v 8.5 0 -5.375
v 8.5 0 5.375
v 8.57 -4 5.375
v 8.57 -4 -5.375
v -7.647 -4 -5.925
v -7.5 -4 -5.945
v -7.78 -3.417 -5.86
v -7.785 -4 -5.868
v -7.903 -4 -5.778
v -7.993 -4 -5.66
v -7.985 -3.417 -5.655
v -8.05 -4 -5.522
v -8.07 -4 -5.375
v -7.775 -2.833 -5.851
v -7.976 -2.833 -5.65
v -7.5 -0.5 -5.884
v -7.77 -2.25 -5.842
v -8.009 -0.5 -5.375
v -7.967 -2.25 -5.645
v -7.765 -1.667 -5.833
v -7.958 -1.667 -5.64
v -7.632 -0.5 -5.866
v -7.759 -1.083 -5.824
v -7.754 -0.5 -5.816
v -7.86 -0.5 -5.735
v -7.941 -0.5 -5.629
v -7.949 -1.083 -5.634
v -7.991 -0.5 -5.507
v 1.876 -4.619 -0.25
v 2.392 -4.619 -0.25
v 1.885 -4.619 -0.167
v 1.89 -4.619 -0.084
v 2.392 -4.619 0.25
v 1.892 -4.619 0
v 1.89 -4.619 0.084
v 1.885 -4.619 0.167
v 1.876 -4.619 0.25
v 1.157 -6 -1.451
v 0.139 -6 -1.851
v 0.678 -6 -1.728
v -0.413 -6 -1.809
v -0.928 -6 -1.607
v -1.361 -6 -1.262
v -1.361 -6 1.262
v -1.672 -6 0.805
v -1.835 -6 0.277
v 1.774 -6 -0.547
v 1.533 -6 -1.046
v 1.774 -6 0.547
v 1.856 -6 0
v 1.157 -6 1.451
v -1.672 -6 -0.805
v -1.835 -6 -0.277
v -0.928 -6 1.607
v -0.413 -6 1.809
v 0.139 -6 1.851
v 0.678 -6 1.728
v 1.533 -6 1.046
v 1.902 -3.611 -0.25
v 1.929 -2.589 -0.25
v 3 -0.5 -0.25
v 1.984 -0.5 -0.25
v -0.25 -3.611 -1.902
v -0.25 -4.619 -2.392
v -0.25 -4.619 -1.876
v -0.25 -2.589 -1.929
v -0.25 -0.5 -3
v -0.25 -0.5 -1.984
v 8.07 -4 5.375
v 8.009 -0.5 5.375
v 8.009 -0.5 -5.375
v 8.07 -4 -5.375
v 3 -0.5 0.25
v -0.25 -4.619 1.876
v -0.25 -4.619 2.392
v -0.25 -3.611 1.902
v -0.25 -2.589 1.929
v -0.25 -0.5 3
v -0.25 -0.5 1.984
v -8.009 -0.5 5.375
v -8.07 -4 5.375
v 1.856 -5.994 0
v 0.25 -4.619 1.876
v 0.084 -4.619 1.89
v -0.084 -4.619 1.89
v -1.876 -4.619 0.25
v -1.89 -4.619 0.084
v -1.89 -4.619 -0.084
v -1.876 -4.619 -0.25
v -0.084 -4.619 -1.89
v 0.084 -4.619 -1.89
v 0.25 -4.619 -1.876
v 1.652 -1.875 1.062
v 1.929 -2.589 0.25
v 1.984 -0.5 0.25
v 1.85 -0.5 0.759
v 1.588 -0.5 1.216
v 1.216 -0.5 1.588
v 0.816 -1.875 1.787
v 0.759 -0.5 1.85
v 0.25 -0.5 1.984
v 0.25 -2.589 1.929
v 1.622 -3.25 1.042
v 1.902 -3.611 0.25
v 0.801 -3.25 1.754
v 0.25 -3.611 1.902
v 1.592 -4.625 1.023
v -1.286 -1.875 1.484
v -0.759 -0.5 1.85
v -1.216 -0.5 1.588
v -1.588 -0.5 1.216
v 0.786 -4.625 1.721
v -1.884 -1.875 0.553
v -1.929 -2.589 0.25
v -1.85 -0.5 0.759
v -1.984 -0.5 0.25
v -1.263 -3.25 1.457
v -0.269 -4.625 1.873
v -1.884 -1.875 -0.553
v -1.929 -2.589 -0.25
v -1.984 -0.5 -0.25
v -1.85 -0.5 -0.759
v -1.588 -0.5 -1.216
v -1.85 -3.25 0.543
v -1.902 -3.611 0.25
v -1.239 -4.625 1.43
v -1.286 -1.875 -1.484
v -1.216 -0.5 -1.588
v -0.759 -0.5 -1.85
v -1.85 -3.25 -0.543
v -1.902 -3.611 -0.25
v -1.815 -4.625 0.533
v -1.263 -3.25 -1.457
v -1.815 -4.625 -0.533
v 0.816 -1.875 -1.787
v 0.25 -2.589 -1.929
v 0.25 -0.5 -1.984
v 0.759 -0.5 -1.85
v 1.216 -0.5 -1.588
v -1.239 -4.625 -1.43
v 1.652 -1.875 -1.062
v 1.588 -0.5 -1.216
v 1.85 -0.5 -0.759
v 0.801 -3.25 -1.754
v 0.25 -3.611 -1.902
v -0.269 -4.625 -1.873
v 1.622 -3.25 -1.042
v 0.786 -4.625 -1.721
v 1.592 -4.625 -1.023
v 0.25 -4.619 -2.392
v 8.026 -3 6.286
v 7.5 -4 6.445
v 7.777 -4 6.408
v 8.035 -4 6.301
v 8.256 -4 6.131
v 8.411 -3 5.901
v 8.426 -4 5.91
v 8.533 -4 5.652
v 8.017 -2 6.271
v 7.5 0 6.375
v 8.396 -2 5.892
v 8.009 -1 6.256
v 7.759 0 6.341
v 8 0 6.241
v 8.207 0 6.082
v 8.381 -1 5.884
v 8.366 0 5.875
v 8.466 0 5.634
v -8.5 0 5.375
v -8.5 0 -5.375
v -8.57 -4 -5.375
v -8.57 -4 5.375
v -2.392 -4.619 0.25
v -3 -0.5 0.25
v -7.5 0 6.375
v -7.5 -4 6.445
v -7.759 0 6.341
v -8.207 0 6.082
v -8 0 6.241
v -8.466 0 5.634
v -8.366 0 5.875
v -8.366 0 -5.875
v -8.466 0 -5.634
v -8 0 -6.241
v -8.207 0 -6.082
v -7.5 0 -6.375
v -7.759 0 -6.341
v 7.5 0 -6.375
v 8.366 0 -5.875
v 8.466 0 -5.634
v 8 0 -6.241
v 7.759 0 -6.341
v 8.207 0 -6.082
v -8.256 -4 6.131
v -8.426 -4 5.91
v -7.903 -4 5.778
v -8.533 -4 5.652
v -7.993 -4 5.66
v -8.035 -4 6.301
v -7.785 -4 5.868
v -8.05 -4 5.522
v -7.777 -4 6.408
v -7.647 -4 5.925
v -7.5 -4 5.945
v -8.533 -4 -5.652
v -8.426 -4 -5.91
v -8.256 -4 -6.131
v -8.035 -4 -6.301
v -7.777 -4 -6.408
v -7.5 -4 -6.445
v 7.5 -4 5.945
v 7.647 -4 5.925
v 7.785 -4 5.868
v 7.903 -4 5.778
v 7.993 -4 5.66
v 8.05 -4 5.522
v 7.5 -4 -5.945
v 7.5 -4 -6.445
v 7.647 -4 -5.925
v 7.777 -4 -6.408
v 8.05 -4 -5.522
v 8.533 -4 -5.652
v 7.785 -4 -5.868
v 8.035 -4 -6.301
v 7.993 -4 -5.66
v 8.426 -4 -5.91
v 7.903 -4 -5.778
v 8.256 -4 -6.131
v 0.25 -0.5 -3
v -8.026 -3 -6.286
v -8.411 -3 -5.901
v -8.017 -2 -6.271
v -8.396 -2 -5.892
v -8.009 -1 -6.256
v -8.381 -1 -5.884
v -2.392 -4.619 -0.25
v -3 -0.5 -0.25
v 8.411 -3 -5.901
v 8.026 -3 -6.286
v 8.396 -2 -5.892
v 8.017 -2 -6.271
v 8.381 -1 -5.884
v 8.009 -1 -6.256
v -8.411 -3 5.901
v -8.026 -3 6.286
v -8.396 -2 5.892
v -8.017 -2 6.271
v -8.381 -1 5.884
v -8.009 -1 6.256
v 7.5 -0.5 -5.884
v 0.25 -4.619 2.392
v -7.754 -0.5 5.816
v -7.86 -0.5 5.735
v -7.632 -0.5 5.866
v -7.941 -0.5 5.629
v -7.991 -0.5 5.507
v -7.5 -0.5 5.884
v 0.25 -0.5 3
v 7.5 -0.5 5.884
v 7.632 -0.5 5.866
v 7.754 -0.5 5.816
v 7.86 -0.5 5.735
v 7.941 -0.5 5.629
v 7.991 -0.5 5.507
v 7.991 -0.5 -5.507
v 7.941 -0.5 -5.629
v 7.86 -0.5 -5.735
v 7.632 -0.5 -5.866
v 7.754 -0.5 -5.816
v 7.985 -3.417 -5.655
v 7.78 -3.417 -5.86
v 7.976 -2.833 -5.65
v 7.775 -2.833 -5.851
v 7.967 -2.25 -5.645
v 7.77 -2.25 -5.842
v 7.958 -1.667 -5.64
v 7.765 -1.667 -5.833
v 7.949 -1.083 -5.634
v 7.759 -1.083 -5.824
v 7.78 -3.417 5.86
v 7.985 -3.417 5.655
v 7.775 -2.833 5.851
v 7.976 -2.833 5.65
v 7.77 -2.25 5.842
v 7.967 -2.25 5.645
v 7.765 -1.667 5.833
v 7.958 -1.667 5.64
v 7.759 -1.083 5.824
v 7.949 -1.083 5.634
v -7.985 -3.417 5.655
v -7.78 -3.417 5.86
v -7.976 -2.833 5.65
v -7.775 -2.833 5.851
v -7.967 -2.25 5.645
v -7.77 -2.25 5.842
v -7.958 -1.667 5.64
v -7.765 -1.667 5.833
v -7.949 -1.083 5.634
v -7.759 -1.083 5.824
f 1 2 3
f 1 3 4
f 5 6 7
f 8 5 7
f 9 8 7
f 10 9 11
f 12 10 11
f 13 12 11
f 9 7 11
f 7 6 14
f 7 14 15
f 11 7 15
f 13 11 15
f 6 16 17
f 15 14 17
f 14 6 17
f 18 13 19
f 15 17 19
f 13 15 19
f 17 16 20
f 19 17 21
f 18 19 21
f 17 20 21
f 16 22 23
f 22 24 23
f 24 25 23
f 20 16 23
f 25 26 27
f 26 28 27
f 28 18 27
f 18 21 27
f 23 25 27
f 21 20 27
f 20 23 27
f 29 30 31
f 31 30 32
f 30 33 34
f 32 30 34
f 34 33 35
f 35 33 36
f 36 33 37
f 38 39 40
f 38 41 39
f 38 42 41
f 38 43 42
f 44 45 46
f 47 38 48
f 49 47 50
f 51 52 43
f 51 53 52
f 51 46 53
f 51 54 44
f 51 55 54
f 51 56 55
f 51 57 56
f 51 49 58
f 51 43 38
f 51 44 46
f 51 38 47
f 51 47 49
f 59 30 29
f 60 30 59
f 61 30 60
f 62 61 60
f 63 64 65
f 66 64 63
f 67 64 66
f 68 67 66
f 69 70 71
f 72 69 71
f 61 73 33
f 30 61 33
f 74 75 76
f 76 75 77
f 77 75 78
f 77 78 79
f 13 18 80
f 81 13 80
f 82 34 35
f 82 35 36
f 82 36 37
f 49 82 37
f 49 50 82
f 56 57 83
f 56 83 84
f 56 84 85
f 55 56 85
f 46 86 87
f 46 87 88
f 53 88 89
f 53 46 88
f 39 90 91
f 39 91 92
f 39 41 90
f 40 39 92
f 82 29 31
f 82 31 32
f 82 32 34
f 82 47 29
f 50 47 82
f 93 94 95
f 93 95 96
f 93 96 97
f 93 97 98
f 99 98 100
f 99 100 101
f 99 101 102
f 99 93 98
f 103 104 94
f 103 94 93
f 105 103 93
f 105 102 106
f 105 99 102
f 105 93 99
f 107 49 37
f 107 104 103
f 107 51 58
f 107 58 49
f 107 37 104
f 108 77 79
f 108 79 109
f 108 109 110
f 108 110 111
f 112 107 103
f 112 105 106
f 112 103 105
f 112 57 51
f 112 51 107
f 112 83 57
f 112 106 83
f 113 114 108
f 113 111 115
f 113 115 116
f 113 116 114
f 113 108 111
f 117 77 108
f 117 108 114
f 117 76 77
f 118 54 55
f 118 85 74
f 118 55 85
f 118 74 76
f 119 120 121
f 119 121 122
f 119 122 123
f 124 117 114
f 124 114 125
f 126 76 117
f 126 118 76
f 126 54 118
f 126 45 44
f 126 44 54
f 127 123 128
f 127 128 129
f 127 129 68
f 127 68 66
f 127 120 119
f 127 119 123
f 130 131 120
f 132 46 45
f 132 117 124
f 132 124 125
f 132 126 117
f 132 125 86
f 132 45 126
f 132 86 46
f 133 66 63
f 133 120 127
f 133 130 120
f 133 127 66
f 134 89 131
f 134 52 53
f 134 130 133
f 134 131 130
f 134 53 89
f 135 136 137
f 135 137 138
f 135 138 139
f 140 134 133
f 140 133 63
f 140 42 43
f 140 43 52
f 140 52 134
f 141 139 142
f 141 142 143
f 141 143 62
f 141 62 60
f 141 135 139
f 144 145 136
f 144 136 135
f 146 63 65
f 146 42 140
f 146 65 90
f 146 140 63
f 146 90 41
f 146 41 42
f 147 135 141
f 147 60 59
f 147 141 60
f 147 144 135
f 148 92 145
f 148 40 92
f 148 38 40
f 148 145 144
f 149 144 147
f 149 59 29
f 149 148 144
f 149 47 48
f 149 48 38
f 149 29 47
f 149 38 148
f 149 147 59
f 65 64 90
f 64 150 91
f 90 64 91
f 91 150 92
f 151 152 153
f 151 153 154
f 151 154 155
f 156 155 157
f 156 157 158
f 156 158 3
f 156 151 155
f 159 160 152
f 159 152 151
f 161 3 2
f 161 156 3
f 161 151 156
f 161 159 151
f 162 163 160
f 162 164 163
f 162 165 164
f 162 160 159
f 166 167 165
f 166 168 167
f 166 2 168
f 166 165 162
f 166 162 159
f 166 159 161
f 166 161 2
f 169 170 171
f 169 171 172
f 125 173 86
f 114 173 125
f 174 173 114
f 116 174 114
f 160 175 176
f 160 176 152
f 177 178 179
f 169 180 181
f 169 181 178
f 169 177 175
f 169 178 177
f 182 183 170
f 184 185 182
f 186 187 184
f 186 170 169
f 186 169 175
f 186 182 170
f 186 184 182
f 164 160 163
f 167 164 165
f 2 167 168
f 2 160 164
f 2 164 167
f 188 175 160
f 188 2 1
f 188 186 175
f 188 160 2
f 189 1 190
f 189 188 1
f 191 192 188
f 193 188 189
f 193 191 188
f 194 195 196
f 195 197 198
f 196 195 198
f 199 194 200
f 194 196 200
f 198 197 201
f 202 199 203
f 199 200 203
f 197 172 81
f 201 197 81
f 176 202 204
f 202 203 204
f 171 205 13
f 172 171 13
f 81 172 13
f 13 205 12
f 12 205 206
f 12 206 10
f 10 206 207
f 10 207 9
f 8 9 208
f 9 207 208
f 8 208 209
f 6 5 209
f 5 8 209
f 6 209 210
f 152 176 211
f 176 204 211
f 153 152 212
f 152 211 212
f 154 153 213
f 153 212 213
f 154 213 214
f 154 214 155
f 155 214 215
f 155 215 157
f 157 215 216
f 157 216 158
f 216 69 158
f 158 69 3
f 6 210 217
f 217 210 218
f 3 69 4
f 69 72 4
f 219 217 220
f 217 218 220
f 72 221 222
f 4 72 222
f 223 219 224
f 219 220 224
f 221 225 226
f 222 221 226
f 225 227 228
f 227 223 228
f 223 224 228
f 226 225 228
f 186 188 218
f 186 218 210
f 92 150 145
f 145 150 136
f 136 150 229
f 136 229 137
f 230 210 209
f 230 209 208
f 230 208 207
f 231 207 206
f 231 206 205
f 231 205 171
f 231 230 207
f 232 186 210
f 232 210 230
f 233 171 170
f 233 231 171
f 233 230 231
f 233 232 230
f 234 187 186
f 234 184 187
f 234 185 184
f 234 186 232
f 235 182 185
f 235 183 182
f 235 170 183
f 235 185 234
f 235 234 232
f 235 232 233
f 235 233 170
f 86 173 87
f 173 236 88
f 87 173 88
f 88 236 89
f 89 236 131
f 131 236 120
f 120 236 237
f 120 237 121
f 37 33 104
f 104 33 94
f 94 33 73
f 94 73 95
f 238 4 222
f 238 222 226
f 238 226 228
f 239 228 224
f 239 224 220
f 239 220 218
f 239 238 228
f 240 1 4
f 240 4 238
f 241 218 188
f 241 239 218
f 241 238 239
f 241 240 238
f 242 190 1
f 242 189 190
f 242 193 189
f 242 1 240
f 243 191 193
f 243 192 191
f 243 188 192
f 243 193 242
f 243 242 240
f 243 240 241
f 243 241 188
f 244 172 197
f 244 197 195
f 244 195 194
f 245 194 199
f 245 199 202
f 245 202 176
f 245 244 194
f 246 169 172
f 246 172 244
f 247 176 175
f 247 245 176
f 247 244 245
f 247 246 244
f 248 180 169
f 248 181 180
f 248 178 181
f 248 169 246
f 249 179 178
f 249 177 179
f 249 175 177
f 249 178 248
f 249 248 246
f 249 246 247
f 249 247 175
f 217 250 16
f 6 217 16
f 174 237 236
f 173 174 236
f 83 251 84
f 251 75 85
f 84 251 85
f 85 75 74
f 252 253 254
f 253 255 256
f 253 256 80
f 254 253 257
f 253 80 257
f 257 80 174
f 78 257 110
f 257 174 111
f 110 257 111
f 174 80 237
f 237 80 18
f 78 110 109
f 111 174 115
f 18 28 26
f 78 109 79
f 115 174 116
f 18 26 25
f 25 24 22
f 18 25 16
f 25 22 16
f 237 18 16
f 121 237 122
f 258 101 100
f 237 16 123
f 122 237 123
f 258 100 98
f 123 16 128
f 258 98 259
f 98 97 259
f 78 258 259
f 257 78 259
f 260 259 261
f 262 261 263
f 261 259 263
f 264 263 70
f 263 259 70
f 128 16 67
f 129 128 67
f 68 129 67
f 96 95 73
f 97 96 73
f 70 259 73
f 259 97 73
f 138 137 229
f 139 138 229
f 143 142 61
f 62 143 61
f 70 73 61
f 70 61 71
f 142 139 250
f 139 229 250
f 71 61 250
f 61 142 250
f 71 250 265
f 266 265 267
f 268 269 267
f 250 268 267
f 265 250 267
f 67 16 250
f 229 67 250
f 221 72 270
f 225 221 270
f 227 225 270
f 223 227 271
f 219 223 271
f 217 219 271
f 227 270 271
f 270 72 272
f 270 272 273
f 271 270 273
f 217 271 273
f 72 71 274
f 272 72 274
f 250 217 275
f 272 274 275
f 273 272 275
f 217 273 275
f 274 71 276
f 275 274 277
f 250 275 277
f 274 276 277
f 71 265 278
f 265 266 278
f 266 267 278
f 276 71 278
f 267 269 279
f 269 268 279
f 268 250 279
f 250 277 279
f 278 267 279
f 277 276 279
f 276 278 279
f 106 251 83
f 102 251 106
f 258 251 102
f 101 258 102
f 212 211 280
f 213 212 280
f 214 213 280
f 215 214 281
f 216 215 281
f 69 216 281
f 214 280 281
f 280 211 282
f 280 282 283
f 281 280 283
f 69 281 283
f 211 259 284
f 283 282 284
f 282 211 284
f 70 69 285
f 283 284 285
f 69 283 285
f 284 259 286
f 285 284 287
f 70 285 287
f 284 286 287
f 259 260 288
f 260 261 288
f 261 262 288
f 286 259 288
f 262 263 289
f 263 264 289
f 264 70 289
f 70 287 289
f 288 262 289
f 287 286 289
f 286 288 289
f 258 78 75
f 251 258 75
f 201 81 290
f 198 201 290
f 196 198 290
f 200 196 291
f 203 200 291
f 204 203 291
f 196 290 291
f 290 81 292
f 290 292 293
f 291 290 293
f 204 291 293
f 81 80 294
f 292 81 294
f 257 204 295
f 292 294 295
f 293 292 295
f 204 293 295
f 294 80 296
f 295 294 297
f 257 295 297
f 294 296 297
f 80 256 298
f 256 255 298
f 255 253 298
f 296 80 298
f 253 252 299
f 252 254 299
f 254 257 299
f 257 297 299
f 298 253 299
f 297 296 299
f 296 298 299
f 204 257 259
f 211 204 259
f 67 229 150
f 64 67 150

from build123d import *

# Parameters (mm, degrees)
BOSS_EXTRUDE1_DEPTH = 4
BOSS_EXTRUDE1_DRAFT = 1
SHELL1_T            = -0.5
SKETCH2_R           = 2
BOSS_EXTRUDE2_DEPTH = 5.5
BOSS_EXTRUDE2_TAPER = 1.5
RIB1_START          = -0.25
RIB1_DEPTH          = 0.5
CIRPATTERN1_COUNT   = 4


# Read off the part's stored shape, not the designer's step: Rib1
with BuildPart() as part:
    # Sketch1 → Boss-Extrude1 (with draft: the straight prism first)
    with BuildSketch(Plane(origin=(0, 0, 0), x_dir=(1, 0, 0), z_dir=(0, 1, 0))):
        with BuildLine():
            Line((-7.5, -6.375), (7.5, -6.375))
            ThreePointArc((7.5, -6.375), (8.207106781, -6.082106781), (8.5, -5.375))
            Line((8.5, -5.375), (8.5, 5.375))
            ThreePointArc((8.5, 5.375), (8.207106781, 6.082106781), (7.5, 6.375))
            Line((7.5, 6.375), (-7.5, 6.375))
            ThreePointArc((-7.5, 6.375), (-8.207106781, 6.082106781), (-8.5, 5.375))
            Line((-8.5, 5.375), (-8.5, -5.375))
            ThreePointArc((-8.5, -5.375), (-8.207106781, -6.082106781), (-7.5, -6.375))
        make_face()
    extrude(amount=-BOSS_EXTRUDE1_DEPTH)
    # Boss-Extrude1: the draft: its side faces are tilted about the plane it starts from
    boss_extrude1_sides = [part.faces().sort_by_distance(p)[0] for p in [
        (0, -2, 6.375),
        (8.207106781, -2, 6.082106781),
        (8.5, -2, 0),
        (8.207106781, -2, -6.082106781),
        (0, -2, -6.375),
        (-8.207106781, -2, -6.082106781),
        (-8.5, -2, 0),
        (-8.207106781, -2, 6.082106781),
    ]]
    draft(boss_extrude1_sides, Plane(origin=(0, 0, 0), x_dir=(1, 0, 0), z_dir=(0, 1, 0)), BOSS_EXTRUDE1_DRAFT)

    # Shell1
    shell1_openings = [part.faces().sort_by_distance(p)[0] for p in [
        (0, -4, 0),
    ]]
    offset(amount=SHELL1_T, openings=shell1_openings, kind=Kind.INTERSECTION)

    # Sketch2 → Boss-Extrude2 (add)
    with BuildSketch(Plane.XZ.offset(0.5)):
        Circle(SKETCH2_R)
    extrude(amount=BOSS_EXTRUDE2_DEPTH, taper=BOSS_EXTRUDE2_TAPER)

    # Rib1 outline → Rib1 (add)
    with BuildSketch(Plane.XY.offset(RIB1_START)):
        Polygon((-2.392140648, -4.618982479), (-1, -4.618982479), (-1, 0), (-3.073787562, 0), (-3, -0.5), align=None)
    rib1 = extrude(amount=RIB1_DEPTH)

    # CirPattern1: Rib1 ×4 about axis
    cirpattern1_axis = Axis((0, 0, 0), (0, 1, 0))
    for i in range(1, CIRPATTERN1_COUNT):
        add(rib1.rotate(cirpattern1_axis, i * 360 / CIRPATTERN1_COUNT))


solid = part.part
